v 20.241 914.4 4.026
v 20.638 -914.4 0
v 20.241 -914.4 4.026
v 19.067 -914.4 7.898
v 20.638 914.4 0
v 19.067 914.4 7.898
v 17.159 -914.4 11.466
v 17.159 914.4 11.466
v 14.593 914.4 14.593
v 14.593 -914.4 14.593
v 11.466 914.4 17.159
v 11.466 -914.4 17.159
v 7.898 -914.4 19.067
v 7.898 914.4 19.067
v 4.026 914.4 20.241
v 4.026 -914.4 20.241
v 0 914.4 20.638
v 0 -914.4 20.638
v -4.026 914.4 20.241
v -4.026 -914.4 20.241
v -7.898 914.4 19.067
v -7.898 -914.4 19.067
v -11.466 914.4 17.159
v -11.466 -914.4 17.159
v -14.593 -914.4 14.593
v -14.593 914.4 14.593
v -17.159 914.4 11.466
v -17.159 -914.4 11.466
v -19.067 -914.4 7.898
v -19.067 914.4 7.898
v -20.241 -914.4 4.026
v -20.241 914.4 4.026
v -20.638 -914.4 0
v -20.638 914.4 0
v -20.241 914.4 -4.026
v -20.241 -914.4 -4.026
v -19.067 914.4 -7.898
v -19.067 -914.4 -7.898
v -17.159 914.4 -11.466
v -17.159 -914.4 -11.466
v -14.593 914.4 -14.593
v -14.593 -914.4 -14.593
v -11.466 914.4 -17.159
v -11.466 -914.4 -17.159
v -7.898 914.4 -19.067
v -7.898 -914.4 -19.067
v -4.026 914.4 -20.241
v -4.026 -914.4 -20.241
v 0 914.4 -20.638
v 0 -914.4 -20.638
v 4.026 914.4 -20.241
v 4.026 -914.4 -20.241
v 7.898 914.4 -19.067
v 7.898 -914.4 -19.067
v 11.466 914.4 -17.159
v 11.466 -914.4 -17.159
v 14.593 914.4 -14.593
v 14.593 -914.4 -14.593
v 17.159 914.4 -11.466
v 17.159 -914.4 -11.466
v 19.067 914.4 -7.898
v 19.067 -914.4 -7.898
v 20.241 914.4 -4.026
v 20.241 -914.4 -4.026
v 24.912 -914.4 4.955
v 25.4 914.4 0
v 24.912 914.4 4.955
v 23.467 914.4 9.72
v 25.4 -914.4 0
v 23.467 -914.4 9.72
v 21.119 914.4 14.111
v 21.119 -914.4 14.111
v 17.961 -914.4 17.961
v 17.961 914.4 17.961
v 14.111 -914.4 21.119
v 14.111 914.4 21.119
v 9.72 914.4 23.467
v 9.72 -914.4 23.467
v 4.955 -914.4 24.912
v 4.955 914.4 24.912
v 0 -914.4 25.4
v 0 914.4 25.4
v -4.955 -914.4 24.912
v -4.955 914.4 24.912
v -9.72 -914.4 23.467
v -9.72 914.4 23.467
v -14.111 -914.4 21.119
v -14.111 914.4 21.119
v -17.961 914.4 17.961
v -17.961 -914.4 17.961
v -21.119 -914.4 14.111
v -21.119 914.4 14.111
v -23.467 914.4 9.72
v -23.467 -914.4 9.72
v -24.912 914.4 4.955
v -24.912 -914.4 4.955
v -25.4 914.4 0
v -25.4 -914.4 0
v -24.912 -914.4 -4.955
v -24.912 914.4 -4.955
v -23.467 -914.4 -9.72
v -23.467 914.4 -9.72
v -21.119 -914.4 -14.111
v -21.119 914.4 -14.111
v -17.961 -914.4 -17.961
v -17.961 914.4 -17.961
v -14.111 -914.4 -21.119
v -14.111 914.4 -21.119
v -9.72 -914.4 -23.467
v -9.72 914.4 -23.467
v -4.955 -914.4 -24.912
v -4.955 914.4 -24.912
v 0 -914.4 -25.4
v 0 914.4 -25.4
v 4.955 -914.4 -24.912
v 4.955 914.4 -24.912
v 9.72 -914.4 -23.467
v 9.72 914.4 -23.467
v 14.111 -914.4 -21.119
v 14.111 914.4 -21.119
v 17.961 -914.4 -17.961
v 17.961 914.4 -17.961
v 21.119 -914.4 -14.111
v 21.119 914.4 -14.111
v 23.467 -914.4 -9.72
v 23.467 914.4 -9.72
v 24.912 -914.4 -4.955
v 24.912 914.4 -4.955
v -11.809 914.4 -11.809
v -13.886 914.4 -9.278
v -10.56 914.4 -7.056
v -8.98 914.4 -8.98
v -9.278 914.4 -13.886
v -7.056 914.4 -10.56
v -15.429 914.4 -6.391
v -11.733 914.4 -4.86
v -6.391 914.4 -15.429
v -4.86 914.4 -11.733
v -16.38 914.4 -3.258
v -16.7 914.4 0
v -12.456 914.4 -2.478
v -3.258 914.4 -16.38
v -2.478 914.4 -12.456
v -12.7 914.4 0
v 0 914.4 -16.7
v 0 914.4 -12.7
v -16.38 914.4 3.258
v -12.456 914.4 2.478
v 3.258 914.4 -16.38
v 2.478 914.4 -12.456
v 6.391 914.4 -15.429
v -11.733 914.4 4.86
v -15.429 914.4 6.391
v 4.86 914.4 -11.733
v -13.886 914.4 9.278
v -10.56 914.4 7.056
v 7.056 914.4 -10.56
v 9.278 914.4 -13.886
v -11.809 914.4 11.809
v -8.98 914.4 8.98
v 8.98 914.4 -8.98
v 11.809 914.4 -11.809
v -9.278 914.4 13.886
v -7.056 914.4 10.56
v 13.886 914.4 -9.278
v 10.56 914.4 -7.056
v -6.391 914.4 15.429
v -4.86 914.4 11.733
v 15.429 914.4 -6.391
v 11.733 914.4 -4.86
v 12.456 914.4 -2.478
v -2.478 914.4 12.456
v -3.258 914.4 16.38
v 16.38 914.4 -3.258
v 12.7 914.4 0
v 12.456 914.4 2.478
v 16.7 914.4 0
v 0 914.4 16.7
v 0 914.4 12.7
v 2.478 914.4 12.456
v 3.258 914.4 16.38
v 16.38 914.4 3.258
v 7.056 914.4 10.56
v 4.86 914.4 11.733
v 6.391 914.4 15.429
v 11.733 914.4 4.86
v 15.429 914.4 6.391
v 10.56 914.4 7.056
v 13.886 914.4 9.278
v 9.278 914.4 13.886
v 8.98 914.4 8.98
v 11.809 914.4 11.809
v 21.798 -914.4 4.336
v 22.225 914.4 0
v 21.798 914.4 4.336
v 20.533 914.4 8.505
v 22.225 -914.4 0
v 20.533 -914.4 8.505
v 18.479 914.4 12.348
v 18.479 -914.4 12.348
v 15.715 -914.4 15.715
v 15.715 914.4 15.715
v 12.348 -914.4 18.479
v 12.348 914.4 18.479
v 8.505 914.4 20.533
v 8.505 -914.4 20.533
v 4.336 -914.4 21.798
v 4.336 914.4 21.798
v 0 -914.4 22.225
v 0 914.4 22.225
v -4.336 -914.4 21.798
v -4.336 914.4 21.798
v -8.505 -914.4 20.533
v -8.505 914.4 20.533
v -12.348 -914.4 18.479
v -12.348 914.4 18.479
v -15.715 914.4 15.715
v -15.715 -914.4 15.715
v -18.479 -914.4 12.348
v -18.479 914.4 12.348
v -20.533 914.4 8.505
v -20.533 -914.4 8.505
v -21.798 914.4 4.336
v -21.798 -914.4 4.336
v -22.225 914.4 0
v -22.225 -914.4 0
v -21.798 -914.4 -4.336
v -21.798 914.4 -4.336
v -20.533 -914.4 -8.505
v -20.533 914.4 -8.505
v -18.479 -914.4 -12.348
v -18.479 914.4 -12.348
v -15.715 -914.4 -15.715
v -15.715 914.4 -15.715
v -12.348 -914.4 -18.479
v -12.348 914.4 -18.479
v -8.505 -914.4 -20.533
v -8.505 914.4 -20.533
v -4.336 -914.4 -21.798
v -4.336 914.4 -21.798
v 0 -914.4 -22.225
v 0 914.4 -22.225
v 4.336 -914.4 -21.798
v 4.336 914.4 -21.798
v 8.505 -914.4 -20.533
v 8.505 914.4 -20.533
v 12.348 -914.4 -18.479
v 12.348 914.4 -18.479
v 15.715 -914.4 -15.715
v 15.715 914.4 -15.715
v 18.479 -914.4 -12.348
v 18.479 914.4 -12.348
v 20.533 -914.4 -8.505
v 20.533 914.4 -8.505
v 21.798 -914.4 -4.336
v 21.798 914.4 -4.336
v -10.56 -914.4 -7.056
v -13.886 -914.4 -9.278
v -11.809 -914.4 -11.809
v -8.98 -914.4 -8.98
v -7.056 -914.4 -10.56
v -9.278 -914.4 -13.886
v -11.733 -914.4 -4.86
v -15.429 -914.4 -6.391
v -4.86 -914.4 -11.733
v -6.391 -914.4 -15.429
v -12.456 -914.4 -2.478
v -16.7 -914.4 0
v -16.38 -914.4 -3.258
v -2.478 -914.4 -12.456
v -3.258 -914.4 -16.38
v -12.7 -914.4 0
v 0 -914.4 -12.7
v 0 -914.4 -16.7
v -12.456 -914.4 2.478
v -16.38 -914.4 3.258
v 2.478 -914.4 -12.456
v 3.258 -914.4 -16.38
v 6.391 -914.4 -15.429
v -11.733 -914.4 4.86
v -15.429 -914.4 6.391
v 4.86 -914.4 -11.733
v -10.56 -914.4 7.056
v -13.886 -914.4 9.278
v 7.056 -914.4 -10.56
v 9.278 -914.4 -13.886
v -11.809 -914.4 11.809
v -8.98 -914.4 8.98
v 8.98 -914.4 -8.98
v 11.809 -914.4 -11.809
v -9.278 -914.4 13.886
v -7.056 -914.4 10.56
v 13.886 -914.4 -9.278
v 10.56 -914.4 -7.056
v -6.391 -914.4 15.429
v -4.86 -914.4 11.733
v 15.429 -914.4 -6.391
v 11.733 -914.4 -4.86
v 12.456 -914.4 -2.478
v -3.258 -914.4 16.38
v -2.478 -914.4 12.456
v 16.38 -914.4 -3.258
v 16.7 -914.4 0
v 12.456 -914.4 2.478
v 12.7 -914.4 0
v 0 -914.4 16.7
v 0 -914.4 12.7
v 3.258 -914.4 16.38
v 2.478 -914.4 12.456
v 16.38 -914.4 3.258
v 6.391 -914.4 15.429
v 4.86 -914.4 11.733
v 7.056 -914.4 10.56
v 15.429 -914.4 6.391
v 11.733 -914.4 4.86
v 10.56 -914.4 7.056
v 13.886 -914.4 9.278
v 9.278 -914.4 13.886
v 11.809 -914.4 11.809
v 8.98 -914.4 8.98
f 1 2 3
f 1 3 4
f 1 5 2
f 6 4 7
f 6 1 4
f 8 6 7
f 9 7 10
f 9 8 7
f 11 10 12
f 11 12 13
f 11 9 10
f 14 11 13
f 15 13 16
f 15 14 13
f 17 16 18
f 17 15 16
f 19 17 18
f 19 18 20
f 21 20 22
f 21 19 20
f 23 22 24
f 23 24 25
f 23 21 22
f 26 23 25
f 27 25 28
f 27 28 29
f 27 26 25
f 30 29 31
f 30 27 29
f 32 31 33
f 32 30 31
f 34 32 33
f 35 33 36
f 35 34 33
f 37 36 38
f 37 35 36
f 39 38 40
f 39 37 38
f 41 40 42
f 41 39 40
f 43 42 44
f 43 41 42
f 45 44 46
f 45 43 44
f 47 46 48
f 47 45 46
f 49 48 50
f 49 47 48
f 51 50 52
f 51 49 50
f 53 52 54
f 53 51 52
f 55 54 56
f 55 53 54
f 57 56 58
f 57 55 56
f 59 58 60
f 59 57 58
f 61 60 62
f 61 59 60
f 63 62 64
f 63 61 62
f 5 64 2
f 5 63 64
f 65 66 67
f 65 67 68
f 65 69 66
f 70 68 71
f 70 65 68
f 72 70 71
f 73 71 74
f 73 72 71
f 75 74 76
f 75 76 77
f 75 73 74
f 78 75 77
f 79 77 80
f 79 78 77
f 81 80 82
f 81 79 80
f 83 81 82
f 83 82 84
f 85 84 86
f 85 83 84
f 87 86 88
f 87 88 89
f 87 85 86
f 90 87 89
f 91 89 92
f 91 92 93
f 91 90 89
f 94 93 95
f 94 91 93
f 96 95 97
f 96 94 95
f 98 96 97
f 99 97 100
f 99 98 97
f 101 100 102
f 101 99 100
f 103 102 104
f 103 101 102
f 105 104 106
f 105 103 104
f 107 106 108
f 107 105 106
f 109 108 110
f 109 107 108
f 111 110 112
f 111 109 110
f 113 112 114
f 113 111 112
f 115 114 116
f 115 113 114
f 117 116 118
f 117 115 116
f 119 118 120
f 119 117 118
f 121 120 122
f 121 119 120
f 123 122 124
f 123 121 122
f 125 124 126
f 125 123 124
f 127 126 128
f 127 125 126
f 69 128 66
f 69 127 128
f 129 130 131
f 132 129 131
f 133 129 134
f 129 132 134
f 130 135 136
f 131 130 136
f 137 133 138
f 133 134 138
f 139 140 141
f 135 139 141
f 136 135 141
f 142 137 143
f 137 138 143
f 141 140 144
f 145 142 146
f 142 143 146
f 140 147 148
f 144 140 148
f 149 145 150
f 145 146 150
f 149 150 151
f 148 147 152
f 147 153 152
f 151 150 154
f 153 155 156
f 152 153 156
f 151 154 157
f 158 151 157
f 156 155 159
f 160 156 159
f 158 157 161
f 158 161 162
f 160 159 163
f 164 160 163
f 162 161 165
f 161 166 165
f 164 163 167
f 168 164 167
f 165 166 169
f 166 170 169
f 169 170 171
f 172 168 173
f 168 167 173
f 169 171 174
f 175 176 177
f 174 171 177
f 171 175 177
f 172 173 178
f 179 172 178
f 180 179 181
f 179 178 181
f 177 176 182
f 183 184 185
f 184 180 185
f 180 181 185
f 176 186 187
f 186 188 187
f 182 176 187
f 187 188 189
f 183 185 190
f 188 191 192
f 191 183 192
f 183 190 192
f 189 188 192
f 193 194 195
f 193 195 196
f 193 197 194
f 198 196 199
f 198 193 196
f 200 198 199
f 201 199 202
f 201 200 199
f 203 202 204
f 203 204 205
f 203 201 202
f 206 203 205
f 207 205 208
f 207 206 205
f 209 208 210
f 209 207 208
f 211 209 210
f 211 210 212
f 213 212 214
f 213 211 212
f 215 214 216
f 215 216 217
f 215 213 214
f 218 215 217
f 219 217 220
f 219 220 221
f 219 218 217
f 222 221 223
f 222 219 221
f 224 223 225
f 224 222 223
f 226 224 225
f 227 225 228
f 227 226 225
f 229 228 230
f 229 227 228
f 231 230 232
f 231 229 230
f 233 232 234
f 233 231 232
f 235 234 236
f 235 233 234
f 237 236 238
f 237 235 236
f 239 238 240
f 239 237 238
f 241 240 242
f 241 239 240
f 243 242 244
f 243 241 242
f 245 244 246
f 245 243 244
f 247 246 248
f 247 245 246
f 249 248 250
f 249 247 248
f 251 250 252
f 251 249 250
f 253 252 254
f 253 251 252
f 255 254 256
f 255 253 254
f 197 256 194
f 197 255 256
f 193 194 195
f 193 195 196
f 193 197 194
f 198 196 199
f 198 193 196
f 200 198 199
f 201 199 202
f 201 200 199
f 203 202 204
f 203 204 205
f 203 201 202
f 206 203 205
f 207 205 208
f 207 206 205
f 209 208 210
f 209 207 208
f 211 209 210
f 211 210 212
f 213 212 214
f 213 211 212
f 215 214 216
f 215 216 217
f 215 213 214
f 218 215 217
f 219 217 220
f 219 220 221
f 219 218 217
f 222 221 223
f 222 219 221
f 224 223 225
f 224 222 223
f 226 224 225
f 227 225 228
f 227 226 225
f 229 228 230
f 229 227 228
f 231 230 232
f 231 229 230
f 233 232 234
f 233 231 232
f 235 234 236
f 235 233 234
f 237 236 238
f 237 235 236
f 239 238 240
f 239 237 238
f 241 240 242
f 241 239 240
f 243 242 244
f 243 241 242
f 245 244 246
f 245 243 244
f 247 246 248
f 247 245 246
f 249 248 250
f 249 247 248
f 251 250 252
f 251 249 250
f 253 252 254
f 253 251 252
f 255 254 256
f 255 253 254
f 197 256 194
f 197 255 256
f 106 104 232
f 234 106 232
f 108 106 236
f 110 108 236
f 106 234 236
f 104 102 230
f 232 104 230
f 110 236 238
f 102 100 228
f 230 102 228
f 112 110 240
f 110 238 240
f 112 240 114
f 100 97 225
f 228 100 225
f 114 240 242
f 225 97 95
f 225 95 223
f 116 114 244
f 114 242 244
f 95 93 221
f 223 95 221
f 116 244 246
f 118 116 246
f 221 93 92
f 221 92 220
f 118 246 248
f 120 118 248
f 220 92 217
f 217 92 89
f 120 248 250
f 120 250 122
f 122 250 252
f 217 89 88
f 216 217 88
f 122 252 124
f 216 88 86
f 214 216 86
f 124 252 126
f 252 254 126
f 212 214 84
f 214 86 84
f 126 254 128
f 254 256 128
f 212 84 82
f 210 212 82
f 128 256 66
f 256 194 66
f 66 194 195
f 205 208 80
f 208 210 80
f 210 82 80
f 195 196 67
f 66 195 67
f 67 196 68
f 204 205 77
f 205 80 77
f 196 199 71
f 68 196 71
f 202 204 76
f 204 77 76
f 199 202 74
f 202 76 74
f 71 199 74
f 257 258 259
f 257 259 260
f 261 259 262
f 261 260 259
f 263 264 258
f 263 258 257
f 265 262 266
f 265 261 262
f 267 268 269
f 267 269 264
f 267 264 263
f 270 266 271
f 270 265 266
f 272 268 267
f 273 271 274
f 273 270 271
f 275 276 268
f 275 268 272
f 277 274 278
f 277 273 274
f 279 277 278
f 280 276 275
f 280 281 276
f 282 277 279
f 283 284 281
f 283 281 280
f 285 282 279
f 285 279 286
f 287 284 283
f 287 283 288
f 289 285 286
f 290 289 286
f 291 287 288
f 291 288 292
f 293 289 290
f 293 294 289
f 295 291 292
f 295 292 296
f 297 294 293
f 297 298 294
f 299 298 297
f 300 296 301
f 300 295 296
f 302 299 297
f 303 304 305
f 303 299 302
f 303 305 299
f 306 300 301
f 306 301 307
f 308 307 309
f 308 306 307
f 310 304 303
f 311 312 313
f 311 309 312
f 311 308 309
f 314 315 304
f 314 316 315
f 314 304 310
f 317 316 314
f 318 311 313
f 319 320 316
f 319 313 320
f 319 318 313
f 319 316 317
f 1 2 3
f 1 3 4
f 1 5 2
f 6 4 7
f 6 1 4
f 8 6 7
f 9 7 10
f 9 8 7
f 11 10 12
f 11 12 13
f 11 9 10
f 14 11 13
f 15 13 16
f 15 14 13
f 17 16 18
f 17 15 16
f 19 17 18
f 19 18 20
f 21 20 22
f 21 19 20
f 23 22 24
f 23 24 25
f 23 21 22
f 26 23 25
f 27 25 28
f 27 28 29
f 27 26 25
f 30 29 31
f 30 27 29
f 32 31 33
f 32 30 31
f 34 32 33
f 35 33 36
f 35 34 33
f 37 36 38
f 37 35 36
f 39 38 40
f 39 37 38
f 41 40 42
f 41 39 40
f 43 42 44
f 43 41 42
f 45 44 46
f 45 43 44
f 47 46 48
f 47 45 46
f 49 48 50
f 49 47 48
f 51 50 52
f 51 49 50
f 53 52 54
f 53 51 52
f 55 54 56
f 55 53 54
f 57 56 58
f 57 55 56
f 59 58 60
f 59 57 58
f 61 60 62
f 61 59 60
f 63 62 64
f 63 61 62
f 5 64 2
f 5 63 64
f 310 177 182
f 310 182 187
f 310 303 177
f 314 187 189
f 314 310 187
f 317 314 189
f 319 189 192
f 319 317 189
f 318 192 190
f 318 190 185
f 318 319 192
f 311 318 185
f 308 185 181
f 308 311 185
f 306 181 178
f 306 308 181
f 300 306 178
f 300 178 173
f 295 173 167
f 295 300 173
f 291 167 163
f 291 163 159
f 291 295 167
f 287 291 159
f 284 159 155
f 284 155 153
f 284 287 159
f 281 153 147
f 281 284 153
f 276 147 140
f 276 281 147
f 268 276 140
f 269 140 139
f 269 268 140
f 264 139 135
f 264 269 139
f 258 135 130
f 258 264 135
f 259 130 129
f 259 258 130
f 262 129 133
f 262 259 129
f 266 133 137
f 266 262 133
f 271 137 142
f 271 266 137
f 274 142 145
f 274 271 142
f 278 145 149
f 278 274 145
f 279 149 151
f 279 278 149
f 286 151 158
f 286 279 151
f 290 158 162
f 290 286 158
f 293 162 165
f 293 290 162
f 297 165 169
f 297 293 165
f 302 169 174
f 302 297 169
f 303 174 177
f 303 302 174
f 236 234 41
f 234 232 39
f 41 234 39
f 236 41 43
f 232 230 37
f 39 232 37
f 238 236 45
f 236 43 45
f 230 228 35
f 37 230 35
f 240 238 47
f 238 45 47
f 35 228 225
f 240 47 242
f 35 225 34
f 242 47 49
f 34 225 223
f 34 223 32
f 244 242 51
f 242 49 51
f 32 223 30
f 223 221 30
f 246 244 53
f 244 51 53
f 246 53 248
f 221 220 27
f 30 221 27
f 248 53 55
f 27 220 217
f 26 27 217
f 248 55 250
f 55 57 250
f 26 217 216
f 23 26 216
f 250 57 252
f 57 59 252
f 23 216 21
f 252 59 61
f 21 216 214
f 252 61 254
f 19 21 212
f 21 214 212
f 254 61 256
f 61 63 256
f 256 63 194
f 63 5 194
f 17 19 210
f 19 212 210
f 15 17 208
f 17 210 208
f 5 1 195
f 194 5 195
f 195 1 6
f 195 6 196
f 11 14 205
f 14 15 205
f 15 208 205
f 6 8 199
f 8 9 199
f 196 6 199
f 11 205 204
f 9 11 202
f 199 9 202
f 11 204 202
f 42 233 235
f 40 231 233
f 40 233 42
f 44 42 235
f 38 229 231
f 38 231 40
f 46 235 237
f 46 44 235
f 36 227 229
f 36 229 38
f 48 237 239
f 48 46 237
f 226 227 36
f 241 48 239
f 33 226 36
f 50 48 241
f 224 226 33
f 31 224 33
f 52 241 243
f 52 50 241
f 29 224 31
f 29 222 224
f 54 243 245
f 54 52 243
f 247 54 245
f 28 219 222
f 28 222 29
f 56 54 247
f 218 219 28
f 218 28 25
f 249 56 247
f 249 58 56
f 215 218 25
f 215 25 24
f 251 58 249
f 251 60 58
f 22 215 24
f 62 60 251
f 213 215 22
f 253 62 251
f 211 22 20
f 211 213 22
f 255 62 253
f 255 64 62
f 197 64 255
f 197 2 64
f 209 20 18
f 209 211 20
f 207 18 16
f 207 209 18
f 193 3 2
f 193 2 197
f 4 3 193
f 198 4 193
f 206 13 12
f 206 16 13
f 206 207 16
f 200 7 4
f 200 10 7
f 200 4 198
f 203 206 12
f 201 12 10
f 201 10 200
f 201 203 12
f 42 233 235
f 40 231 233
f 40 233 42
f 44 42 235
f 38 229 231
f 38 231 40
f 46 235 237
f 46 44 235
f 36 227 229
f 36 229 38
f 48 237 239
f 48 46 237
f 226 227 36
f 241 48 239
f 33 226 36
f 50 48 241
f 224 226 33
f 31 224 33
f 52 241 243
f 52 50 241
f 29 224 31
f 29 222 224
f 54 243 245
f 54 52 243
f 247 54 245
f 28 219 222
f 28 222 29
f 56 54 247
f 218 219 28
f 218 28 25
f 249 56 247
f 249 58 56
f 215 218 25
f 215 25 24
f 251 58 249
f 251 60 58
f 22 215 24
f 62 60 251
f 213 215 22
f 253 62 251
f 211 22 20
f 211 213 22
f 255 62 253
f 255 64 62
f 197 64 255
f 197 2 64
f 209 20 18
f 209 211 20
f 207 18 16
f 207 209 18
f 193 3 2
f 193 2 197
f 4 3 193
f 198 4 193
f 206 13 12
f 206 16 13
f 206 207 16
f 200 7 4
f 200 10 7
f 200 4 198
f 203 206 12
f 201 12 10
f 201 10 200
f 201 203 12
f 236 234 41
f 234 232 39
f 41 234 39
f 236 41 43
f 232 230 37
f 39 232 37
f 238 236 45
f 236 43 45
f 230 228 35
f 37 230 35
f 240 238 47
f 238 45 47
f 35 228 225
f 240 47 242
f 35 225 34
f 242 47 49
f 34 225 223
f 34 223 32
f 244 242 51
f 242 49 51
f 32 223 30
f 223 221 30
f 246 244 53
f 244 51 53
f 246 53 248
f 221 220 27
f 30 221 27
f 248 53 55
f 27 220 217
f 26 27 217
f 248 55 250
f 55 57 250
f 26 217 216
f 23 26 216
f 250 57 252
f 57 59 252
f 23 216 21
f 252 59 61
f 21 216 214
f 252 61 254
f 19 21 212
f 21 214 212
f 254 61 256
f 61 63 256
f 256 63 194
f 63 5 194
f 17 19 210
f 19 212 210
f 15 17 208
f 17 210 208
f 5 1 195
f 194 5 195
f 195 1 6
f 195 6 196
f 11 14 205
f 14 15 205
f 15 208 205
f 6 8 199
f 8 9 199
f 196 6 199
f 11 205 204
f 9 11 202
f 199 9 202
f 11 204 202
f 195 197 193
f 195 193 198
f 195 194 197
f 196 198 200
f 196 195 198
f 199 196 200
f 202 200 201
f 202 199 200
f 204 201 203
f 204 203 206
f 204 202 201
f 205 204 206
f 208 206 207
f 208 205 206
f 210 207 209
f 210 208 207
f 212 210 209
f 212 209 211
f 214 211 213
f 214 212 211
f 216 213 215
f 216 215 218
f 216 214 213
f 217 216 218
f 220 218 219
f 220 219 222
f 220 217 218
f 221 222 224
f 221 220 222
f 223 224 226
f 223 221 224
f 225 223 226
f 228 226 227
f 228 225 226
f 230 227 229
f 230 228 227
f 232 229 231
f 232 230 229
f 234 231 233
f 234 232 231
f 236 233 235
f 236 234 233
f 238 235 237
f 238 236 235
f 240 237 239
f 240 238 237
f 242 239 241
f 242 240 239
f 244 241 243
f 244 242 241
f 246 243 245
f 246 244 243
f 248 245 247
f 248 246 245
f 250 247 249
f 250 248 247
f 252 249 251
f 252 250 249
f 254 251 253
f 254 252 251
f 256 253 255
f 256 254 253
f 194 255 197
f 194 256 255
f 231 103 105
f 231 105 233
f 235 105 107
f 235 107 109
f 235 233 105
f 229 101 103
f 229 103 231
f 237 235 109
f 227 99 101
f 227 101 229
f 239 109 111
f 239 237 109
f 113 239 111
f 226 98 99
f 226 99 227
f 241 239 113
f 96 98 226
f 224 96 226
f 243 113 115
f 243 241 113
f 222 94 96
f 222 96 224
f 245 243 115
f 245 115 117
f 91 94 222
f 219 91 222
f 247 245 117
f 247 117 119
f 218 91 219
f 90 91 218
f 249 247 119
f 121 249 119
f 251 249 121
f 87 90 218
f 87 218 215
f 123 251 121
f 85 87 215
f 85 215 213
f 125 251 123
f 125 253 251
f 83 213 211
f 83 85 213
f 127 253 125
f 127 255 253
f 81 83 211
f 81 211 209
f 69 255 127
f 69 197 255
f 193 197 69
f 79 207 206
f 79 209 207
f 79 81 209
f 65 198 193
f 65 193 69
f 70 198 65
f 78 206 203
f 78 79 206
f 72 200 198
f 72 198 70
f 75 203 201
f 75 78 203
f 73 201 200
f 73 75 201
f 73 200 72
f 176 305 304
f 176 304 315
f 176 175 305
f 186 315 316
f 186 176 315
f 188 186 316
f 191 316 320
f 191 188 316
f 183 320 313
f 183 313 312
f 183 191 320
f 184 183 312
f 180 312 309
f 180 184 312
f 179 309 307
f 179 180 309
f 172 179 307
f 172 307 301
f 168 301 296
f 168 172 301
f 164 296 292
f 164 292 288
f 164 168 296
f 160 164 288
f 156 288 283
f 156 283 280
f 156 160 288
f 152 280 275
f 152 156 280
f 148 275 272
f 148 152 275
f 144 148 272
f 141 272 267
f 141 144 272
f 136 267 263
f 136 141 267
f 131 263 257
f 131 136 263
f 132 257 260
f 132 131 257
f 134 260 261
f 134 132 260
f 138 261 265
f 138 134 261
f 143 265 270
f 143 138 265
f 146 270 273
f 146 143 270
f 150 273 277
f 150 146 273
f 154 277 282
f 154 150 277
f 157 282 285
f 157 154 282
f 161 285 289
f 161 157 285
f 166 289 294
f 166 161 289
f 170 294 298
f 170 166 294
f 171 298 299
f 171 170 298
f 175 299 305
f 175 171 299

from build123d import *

# Parameters (mm, degrees)
F2_R     = 22.225
F2_R_2   = 20.6375
F4_DEPTH = 914.4
F1_R     = 22.225
F1_R_2   = 20.6375
F5_DEPTH = 914.4
F0_R     = 25.4
F0_R_2   = 22.225
F6_DEPTH = 914.4
F3_R     = 16.7005
F3_R_2   = 12.7
F7_DEPTH = 914.4


with BuildPart() as f4:
    # F2 (on Front) → F4 (new body, symmetric)
    with BuildSketch(Plane.XZ):
        Circle(F2_R)
        Circle(F2_R_2, mode=Mode.SUBTRACT)
    extrude(amount=F4_DEPTH, both=True)


with BuildPart() as f5:
    # F1 (on Front) → F5 (new body, symmetric)
    with BuildSketch(Plane.XZ):
        Circle(F1_R)
        Circle(F1_R_2, mode=Mode.SUBTRACT)
    extrude(amount=F5_DEPTH, both=True)


with BuildPart() as f6:
    # F0 (on Front) → F6 (new body, symmetric)
    with BuildSketch(Plane.XZ):
        Circle(F0_R)
        Circle(F0_R_2, mode=Mode.SUBTRACT)
    extrude(amount=F6_DEPTH, both=True)


with BuildPart() as f7:
    # F3 (on Front) → F7 (new body, symmetric)
    with BuildSketch(Plane.XZ):
        Circle(F3_R)
        Circle(F3_R_2, mode=Mode.SUBTRACT)
    extrude(amount=F7_DEPTH, both=True)


solid = Compound([f4.part, f5.part, f6.part, f7.part])
